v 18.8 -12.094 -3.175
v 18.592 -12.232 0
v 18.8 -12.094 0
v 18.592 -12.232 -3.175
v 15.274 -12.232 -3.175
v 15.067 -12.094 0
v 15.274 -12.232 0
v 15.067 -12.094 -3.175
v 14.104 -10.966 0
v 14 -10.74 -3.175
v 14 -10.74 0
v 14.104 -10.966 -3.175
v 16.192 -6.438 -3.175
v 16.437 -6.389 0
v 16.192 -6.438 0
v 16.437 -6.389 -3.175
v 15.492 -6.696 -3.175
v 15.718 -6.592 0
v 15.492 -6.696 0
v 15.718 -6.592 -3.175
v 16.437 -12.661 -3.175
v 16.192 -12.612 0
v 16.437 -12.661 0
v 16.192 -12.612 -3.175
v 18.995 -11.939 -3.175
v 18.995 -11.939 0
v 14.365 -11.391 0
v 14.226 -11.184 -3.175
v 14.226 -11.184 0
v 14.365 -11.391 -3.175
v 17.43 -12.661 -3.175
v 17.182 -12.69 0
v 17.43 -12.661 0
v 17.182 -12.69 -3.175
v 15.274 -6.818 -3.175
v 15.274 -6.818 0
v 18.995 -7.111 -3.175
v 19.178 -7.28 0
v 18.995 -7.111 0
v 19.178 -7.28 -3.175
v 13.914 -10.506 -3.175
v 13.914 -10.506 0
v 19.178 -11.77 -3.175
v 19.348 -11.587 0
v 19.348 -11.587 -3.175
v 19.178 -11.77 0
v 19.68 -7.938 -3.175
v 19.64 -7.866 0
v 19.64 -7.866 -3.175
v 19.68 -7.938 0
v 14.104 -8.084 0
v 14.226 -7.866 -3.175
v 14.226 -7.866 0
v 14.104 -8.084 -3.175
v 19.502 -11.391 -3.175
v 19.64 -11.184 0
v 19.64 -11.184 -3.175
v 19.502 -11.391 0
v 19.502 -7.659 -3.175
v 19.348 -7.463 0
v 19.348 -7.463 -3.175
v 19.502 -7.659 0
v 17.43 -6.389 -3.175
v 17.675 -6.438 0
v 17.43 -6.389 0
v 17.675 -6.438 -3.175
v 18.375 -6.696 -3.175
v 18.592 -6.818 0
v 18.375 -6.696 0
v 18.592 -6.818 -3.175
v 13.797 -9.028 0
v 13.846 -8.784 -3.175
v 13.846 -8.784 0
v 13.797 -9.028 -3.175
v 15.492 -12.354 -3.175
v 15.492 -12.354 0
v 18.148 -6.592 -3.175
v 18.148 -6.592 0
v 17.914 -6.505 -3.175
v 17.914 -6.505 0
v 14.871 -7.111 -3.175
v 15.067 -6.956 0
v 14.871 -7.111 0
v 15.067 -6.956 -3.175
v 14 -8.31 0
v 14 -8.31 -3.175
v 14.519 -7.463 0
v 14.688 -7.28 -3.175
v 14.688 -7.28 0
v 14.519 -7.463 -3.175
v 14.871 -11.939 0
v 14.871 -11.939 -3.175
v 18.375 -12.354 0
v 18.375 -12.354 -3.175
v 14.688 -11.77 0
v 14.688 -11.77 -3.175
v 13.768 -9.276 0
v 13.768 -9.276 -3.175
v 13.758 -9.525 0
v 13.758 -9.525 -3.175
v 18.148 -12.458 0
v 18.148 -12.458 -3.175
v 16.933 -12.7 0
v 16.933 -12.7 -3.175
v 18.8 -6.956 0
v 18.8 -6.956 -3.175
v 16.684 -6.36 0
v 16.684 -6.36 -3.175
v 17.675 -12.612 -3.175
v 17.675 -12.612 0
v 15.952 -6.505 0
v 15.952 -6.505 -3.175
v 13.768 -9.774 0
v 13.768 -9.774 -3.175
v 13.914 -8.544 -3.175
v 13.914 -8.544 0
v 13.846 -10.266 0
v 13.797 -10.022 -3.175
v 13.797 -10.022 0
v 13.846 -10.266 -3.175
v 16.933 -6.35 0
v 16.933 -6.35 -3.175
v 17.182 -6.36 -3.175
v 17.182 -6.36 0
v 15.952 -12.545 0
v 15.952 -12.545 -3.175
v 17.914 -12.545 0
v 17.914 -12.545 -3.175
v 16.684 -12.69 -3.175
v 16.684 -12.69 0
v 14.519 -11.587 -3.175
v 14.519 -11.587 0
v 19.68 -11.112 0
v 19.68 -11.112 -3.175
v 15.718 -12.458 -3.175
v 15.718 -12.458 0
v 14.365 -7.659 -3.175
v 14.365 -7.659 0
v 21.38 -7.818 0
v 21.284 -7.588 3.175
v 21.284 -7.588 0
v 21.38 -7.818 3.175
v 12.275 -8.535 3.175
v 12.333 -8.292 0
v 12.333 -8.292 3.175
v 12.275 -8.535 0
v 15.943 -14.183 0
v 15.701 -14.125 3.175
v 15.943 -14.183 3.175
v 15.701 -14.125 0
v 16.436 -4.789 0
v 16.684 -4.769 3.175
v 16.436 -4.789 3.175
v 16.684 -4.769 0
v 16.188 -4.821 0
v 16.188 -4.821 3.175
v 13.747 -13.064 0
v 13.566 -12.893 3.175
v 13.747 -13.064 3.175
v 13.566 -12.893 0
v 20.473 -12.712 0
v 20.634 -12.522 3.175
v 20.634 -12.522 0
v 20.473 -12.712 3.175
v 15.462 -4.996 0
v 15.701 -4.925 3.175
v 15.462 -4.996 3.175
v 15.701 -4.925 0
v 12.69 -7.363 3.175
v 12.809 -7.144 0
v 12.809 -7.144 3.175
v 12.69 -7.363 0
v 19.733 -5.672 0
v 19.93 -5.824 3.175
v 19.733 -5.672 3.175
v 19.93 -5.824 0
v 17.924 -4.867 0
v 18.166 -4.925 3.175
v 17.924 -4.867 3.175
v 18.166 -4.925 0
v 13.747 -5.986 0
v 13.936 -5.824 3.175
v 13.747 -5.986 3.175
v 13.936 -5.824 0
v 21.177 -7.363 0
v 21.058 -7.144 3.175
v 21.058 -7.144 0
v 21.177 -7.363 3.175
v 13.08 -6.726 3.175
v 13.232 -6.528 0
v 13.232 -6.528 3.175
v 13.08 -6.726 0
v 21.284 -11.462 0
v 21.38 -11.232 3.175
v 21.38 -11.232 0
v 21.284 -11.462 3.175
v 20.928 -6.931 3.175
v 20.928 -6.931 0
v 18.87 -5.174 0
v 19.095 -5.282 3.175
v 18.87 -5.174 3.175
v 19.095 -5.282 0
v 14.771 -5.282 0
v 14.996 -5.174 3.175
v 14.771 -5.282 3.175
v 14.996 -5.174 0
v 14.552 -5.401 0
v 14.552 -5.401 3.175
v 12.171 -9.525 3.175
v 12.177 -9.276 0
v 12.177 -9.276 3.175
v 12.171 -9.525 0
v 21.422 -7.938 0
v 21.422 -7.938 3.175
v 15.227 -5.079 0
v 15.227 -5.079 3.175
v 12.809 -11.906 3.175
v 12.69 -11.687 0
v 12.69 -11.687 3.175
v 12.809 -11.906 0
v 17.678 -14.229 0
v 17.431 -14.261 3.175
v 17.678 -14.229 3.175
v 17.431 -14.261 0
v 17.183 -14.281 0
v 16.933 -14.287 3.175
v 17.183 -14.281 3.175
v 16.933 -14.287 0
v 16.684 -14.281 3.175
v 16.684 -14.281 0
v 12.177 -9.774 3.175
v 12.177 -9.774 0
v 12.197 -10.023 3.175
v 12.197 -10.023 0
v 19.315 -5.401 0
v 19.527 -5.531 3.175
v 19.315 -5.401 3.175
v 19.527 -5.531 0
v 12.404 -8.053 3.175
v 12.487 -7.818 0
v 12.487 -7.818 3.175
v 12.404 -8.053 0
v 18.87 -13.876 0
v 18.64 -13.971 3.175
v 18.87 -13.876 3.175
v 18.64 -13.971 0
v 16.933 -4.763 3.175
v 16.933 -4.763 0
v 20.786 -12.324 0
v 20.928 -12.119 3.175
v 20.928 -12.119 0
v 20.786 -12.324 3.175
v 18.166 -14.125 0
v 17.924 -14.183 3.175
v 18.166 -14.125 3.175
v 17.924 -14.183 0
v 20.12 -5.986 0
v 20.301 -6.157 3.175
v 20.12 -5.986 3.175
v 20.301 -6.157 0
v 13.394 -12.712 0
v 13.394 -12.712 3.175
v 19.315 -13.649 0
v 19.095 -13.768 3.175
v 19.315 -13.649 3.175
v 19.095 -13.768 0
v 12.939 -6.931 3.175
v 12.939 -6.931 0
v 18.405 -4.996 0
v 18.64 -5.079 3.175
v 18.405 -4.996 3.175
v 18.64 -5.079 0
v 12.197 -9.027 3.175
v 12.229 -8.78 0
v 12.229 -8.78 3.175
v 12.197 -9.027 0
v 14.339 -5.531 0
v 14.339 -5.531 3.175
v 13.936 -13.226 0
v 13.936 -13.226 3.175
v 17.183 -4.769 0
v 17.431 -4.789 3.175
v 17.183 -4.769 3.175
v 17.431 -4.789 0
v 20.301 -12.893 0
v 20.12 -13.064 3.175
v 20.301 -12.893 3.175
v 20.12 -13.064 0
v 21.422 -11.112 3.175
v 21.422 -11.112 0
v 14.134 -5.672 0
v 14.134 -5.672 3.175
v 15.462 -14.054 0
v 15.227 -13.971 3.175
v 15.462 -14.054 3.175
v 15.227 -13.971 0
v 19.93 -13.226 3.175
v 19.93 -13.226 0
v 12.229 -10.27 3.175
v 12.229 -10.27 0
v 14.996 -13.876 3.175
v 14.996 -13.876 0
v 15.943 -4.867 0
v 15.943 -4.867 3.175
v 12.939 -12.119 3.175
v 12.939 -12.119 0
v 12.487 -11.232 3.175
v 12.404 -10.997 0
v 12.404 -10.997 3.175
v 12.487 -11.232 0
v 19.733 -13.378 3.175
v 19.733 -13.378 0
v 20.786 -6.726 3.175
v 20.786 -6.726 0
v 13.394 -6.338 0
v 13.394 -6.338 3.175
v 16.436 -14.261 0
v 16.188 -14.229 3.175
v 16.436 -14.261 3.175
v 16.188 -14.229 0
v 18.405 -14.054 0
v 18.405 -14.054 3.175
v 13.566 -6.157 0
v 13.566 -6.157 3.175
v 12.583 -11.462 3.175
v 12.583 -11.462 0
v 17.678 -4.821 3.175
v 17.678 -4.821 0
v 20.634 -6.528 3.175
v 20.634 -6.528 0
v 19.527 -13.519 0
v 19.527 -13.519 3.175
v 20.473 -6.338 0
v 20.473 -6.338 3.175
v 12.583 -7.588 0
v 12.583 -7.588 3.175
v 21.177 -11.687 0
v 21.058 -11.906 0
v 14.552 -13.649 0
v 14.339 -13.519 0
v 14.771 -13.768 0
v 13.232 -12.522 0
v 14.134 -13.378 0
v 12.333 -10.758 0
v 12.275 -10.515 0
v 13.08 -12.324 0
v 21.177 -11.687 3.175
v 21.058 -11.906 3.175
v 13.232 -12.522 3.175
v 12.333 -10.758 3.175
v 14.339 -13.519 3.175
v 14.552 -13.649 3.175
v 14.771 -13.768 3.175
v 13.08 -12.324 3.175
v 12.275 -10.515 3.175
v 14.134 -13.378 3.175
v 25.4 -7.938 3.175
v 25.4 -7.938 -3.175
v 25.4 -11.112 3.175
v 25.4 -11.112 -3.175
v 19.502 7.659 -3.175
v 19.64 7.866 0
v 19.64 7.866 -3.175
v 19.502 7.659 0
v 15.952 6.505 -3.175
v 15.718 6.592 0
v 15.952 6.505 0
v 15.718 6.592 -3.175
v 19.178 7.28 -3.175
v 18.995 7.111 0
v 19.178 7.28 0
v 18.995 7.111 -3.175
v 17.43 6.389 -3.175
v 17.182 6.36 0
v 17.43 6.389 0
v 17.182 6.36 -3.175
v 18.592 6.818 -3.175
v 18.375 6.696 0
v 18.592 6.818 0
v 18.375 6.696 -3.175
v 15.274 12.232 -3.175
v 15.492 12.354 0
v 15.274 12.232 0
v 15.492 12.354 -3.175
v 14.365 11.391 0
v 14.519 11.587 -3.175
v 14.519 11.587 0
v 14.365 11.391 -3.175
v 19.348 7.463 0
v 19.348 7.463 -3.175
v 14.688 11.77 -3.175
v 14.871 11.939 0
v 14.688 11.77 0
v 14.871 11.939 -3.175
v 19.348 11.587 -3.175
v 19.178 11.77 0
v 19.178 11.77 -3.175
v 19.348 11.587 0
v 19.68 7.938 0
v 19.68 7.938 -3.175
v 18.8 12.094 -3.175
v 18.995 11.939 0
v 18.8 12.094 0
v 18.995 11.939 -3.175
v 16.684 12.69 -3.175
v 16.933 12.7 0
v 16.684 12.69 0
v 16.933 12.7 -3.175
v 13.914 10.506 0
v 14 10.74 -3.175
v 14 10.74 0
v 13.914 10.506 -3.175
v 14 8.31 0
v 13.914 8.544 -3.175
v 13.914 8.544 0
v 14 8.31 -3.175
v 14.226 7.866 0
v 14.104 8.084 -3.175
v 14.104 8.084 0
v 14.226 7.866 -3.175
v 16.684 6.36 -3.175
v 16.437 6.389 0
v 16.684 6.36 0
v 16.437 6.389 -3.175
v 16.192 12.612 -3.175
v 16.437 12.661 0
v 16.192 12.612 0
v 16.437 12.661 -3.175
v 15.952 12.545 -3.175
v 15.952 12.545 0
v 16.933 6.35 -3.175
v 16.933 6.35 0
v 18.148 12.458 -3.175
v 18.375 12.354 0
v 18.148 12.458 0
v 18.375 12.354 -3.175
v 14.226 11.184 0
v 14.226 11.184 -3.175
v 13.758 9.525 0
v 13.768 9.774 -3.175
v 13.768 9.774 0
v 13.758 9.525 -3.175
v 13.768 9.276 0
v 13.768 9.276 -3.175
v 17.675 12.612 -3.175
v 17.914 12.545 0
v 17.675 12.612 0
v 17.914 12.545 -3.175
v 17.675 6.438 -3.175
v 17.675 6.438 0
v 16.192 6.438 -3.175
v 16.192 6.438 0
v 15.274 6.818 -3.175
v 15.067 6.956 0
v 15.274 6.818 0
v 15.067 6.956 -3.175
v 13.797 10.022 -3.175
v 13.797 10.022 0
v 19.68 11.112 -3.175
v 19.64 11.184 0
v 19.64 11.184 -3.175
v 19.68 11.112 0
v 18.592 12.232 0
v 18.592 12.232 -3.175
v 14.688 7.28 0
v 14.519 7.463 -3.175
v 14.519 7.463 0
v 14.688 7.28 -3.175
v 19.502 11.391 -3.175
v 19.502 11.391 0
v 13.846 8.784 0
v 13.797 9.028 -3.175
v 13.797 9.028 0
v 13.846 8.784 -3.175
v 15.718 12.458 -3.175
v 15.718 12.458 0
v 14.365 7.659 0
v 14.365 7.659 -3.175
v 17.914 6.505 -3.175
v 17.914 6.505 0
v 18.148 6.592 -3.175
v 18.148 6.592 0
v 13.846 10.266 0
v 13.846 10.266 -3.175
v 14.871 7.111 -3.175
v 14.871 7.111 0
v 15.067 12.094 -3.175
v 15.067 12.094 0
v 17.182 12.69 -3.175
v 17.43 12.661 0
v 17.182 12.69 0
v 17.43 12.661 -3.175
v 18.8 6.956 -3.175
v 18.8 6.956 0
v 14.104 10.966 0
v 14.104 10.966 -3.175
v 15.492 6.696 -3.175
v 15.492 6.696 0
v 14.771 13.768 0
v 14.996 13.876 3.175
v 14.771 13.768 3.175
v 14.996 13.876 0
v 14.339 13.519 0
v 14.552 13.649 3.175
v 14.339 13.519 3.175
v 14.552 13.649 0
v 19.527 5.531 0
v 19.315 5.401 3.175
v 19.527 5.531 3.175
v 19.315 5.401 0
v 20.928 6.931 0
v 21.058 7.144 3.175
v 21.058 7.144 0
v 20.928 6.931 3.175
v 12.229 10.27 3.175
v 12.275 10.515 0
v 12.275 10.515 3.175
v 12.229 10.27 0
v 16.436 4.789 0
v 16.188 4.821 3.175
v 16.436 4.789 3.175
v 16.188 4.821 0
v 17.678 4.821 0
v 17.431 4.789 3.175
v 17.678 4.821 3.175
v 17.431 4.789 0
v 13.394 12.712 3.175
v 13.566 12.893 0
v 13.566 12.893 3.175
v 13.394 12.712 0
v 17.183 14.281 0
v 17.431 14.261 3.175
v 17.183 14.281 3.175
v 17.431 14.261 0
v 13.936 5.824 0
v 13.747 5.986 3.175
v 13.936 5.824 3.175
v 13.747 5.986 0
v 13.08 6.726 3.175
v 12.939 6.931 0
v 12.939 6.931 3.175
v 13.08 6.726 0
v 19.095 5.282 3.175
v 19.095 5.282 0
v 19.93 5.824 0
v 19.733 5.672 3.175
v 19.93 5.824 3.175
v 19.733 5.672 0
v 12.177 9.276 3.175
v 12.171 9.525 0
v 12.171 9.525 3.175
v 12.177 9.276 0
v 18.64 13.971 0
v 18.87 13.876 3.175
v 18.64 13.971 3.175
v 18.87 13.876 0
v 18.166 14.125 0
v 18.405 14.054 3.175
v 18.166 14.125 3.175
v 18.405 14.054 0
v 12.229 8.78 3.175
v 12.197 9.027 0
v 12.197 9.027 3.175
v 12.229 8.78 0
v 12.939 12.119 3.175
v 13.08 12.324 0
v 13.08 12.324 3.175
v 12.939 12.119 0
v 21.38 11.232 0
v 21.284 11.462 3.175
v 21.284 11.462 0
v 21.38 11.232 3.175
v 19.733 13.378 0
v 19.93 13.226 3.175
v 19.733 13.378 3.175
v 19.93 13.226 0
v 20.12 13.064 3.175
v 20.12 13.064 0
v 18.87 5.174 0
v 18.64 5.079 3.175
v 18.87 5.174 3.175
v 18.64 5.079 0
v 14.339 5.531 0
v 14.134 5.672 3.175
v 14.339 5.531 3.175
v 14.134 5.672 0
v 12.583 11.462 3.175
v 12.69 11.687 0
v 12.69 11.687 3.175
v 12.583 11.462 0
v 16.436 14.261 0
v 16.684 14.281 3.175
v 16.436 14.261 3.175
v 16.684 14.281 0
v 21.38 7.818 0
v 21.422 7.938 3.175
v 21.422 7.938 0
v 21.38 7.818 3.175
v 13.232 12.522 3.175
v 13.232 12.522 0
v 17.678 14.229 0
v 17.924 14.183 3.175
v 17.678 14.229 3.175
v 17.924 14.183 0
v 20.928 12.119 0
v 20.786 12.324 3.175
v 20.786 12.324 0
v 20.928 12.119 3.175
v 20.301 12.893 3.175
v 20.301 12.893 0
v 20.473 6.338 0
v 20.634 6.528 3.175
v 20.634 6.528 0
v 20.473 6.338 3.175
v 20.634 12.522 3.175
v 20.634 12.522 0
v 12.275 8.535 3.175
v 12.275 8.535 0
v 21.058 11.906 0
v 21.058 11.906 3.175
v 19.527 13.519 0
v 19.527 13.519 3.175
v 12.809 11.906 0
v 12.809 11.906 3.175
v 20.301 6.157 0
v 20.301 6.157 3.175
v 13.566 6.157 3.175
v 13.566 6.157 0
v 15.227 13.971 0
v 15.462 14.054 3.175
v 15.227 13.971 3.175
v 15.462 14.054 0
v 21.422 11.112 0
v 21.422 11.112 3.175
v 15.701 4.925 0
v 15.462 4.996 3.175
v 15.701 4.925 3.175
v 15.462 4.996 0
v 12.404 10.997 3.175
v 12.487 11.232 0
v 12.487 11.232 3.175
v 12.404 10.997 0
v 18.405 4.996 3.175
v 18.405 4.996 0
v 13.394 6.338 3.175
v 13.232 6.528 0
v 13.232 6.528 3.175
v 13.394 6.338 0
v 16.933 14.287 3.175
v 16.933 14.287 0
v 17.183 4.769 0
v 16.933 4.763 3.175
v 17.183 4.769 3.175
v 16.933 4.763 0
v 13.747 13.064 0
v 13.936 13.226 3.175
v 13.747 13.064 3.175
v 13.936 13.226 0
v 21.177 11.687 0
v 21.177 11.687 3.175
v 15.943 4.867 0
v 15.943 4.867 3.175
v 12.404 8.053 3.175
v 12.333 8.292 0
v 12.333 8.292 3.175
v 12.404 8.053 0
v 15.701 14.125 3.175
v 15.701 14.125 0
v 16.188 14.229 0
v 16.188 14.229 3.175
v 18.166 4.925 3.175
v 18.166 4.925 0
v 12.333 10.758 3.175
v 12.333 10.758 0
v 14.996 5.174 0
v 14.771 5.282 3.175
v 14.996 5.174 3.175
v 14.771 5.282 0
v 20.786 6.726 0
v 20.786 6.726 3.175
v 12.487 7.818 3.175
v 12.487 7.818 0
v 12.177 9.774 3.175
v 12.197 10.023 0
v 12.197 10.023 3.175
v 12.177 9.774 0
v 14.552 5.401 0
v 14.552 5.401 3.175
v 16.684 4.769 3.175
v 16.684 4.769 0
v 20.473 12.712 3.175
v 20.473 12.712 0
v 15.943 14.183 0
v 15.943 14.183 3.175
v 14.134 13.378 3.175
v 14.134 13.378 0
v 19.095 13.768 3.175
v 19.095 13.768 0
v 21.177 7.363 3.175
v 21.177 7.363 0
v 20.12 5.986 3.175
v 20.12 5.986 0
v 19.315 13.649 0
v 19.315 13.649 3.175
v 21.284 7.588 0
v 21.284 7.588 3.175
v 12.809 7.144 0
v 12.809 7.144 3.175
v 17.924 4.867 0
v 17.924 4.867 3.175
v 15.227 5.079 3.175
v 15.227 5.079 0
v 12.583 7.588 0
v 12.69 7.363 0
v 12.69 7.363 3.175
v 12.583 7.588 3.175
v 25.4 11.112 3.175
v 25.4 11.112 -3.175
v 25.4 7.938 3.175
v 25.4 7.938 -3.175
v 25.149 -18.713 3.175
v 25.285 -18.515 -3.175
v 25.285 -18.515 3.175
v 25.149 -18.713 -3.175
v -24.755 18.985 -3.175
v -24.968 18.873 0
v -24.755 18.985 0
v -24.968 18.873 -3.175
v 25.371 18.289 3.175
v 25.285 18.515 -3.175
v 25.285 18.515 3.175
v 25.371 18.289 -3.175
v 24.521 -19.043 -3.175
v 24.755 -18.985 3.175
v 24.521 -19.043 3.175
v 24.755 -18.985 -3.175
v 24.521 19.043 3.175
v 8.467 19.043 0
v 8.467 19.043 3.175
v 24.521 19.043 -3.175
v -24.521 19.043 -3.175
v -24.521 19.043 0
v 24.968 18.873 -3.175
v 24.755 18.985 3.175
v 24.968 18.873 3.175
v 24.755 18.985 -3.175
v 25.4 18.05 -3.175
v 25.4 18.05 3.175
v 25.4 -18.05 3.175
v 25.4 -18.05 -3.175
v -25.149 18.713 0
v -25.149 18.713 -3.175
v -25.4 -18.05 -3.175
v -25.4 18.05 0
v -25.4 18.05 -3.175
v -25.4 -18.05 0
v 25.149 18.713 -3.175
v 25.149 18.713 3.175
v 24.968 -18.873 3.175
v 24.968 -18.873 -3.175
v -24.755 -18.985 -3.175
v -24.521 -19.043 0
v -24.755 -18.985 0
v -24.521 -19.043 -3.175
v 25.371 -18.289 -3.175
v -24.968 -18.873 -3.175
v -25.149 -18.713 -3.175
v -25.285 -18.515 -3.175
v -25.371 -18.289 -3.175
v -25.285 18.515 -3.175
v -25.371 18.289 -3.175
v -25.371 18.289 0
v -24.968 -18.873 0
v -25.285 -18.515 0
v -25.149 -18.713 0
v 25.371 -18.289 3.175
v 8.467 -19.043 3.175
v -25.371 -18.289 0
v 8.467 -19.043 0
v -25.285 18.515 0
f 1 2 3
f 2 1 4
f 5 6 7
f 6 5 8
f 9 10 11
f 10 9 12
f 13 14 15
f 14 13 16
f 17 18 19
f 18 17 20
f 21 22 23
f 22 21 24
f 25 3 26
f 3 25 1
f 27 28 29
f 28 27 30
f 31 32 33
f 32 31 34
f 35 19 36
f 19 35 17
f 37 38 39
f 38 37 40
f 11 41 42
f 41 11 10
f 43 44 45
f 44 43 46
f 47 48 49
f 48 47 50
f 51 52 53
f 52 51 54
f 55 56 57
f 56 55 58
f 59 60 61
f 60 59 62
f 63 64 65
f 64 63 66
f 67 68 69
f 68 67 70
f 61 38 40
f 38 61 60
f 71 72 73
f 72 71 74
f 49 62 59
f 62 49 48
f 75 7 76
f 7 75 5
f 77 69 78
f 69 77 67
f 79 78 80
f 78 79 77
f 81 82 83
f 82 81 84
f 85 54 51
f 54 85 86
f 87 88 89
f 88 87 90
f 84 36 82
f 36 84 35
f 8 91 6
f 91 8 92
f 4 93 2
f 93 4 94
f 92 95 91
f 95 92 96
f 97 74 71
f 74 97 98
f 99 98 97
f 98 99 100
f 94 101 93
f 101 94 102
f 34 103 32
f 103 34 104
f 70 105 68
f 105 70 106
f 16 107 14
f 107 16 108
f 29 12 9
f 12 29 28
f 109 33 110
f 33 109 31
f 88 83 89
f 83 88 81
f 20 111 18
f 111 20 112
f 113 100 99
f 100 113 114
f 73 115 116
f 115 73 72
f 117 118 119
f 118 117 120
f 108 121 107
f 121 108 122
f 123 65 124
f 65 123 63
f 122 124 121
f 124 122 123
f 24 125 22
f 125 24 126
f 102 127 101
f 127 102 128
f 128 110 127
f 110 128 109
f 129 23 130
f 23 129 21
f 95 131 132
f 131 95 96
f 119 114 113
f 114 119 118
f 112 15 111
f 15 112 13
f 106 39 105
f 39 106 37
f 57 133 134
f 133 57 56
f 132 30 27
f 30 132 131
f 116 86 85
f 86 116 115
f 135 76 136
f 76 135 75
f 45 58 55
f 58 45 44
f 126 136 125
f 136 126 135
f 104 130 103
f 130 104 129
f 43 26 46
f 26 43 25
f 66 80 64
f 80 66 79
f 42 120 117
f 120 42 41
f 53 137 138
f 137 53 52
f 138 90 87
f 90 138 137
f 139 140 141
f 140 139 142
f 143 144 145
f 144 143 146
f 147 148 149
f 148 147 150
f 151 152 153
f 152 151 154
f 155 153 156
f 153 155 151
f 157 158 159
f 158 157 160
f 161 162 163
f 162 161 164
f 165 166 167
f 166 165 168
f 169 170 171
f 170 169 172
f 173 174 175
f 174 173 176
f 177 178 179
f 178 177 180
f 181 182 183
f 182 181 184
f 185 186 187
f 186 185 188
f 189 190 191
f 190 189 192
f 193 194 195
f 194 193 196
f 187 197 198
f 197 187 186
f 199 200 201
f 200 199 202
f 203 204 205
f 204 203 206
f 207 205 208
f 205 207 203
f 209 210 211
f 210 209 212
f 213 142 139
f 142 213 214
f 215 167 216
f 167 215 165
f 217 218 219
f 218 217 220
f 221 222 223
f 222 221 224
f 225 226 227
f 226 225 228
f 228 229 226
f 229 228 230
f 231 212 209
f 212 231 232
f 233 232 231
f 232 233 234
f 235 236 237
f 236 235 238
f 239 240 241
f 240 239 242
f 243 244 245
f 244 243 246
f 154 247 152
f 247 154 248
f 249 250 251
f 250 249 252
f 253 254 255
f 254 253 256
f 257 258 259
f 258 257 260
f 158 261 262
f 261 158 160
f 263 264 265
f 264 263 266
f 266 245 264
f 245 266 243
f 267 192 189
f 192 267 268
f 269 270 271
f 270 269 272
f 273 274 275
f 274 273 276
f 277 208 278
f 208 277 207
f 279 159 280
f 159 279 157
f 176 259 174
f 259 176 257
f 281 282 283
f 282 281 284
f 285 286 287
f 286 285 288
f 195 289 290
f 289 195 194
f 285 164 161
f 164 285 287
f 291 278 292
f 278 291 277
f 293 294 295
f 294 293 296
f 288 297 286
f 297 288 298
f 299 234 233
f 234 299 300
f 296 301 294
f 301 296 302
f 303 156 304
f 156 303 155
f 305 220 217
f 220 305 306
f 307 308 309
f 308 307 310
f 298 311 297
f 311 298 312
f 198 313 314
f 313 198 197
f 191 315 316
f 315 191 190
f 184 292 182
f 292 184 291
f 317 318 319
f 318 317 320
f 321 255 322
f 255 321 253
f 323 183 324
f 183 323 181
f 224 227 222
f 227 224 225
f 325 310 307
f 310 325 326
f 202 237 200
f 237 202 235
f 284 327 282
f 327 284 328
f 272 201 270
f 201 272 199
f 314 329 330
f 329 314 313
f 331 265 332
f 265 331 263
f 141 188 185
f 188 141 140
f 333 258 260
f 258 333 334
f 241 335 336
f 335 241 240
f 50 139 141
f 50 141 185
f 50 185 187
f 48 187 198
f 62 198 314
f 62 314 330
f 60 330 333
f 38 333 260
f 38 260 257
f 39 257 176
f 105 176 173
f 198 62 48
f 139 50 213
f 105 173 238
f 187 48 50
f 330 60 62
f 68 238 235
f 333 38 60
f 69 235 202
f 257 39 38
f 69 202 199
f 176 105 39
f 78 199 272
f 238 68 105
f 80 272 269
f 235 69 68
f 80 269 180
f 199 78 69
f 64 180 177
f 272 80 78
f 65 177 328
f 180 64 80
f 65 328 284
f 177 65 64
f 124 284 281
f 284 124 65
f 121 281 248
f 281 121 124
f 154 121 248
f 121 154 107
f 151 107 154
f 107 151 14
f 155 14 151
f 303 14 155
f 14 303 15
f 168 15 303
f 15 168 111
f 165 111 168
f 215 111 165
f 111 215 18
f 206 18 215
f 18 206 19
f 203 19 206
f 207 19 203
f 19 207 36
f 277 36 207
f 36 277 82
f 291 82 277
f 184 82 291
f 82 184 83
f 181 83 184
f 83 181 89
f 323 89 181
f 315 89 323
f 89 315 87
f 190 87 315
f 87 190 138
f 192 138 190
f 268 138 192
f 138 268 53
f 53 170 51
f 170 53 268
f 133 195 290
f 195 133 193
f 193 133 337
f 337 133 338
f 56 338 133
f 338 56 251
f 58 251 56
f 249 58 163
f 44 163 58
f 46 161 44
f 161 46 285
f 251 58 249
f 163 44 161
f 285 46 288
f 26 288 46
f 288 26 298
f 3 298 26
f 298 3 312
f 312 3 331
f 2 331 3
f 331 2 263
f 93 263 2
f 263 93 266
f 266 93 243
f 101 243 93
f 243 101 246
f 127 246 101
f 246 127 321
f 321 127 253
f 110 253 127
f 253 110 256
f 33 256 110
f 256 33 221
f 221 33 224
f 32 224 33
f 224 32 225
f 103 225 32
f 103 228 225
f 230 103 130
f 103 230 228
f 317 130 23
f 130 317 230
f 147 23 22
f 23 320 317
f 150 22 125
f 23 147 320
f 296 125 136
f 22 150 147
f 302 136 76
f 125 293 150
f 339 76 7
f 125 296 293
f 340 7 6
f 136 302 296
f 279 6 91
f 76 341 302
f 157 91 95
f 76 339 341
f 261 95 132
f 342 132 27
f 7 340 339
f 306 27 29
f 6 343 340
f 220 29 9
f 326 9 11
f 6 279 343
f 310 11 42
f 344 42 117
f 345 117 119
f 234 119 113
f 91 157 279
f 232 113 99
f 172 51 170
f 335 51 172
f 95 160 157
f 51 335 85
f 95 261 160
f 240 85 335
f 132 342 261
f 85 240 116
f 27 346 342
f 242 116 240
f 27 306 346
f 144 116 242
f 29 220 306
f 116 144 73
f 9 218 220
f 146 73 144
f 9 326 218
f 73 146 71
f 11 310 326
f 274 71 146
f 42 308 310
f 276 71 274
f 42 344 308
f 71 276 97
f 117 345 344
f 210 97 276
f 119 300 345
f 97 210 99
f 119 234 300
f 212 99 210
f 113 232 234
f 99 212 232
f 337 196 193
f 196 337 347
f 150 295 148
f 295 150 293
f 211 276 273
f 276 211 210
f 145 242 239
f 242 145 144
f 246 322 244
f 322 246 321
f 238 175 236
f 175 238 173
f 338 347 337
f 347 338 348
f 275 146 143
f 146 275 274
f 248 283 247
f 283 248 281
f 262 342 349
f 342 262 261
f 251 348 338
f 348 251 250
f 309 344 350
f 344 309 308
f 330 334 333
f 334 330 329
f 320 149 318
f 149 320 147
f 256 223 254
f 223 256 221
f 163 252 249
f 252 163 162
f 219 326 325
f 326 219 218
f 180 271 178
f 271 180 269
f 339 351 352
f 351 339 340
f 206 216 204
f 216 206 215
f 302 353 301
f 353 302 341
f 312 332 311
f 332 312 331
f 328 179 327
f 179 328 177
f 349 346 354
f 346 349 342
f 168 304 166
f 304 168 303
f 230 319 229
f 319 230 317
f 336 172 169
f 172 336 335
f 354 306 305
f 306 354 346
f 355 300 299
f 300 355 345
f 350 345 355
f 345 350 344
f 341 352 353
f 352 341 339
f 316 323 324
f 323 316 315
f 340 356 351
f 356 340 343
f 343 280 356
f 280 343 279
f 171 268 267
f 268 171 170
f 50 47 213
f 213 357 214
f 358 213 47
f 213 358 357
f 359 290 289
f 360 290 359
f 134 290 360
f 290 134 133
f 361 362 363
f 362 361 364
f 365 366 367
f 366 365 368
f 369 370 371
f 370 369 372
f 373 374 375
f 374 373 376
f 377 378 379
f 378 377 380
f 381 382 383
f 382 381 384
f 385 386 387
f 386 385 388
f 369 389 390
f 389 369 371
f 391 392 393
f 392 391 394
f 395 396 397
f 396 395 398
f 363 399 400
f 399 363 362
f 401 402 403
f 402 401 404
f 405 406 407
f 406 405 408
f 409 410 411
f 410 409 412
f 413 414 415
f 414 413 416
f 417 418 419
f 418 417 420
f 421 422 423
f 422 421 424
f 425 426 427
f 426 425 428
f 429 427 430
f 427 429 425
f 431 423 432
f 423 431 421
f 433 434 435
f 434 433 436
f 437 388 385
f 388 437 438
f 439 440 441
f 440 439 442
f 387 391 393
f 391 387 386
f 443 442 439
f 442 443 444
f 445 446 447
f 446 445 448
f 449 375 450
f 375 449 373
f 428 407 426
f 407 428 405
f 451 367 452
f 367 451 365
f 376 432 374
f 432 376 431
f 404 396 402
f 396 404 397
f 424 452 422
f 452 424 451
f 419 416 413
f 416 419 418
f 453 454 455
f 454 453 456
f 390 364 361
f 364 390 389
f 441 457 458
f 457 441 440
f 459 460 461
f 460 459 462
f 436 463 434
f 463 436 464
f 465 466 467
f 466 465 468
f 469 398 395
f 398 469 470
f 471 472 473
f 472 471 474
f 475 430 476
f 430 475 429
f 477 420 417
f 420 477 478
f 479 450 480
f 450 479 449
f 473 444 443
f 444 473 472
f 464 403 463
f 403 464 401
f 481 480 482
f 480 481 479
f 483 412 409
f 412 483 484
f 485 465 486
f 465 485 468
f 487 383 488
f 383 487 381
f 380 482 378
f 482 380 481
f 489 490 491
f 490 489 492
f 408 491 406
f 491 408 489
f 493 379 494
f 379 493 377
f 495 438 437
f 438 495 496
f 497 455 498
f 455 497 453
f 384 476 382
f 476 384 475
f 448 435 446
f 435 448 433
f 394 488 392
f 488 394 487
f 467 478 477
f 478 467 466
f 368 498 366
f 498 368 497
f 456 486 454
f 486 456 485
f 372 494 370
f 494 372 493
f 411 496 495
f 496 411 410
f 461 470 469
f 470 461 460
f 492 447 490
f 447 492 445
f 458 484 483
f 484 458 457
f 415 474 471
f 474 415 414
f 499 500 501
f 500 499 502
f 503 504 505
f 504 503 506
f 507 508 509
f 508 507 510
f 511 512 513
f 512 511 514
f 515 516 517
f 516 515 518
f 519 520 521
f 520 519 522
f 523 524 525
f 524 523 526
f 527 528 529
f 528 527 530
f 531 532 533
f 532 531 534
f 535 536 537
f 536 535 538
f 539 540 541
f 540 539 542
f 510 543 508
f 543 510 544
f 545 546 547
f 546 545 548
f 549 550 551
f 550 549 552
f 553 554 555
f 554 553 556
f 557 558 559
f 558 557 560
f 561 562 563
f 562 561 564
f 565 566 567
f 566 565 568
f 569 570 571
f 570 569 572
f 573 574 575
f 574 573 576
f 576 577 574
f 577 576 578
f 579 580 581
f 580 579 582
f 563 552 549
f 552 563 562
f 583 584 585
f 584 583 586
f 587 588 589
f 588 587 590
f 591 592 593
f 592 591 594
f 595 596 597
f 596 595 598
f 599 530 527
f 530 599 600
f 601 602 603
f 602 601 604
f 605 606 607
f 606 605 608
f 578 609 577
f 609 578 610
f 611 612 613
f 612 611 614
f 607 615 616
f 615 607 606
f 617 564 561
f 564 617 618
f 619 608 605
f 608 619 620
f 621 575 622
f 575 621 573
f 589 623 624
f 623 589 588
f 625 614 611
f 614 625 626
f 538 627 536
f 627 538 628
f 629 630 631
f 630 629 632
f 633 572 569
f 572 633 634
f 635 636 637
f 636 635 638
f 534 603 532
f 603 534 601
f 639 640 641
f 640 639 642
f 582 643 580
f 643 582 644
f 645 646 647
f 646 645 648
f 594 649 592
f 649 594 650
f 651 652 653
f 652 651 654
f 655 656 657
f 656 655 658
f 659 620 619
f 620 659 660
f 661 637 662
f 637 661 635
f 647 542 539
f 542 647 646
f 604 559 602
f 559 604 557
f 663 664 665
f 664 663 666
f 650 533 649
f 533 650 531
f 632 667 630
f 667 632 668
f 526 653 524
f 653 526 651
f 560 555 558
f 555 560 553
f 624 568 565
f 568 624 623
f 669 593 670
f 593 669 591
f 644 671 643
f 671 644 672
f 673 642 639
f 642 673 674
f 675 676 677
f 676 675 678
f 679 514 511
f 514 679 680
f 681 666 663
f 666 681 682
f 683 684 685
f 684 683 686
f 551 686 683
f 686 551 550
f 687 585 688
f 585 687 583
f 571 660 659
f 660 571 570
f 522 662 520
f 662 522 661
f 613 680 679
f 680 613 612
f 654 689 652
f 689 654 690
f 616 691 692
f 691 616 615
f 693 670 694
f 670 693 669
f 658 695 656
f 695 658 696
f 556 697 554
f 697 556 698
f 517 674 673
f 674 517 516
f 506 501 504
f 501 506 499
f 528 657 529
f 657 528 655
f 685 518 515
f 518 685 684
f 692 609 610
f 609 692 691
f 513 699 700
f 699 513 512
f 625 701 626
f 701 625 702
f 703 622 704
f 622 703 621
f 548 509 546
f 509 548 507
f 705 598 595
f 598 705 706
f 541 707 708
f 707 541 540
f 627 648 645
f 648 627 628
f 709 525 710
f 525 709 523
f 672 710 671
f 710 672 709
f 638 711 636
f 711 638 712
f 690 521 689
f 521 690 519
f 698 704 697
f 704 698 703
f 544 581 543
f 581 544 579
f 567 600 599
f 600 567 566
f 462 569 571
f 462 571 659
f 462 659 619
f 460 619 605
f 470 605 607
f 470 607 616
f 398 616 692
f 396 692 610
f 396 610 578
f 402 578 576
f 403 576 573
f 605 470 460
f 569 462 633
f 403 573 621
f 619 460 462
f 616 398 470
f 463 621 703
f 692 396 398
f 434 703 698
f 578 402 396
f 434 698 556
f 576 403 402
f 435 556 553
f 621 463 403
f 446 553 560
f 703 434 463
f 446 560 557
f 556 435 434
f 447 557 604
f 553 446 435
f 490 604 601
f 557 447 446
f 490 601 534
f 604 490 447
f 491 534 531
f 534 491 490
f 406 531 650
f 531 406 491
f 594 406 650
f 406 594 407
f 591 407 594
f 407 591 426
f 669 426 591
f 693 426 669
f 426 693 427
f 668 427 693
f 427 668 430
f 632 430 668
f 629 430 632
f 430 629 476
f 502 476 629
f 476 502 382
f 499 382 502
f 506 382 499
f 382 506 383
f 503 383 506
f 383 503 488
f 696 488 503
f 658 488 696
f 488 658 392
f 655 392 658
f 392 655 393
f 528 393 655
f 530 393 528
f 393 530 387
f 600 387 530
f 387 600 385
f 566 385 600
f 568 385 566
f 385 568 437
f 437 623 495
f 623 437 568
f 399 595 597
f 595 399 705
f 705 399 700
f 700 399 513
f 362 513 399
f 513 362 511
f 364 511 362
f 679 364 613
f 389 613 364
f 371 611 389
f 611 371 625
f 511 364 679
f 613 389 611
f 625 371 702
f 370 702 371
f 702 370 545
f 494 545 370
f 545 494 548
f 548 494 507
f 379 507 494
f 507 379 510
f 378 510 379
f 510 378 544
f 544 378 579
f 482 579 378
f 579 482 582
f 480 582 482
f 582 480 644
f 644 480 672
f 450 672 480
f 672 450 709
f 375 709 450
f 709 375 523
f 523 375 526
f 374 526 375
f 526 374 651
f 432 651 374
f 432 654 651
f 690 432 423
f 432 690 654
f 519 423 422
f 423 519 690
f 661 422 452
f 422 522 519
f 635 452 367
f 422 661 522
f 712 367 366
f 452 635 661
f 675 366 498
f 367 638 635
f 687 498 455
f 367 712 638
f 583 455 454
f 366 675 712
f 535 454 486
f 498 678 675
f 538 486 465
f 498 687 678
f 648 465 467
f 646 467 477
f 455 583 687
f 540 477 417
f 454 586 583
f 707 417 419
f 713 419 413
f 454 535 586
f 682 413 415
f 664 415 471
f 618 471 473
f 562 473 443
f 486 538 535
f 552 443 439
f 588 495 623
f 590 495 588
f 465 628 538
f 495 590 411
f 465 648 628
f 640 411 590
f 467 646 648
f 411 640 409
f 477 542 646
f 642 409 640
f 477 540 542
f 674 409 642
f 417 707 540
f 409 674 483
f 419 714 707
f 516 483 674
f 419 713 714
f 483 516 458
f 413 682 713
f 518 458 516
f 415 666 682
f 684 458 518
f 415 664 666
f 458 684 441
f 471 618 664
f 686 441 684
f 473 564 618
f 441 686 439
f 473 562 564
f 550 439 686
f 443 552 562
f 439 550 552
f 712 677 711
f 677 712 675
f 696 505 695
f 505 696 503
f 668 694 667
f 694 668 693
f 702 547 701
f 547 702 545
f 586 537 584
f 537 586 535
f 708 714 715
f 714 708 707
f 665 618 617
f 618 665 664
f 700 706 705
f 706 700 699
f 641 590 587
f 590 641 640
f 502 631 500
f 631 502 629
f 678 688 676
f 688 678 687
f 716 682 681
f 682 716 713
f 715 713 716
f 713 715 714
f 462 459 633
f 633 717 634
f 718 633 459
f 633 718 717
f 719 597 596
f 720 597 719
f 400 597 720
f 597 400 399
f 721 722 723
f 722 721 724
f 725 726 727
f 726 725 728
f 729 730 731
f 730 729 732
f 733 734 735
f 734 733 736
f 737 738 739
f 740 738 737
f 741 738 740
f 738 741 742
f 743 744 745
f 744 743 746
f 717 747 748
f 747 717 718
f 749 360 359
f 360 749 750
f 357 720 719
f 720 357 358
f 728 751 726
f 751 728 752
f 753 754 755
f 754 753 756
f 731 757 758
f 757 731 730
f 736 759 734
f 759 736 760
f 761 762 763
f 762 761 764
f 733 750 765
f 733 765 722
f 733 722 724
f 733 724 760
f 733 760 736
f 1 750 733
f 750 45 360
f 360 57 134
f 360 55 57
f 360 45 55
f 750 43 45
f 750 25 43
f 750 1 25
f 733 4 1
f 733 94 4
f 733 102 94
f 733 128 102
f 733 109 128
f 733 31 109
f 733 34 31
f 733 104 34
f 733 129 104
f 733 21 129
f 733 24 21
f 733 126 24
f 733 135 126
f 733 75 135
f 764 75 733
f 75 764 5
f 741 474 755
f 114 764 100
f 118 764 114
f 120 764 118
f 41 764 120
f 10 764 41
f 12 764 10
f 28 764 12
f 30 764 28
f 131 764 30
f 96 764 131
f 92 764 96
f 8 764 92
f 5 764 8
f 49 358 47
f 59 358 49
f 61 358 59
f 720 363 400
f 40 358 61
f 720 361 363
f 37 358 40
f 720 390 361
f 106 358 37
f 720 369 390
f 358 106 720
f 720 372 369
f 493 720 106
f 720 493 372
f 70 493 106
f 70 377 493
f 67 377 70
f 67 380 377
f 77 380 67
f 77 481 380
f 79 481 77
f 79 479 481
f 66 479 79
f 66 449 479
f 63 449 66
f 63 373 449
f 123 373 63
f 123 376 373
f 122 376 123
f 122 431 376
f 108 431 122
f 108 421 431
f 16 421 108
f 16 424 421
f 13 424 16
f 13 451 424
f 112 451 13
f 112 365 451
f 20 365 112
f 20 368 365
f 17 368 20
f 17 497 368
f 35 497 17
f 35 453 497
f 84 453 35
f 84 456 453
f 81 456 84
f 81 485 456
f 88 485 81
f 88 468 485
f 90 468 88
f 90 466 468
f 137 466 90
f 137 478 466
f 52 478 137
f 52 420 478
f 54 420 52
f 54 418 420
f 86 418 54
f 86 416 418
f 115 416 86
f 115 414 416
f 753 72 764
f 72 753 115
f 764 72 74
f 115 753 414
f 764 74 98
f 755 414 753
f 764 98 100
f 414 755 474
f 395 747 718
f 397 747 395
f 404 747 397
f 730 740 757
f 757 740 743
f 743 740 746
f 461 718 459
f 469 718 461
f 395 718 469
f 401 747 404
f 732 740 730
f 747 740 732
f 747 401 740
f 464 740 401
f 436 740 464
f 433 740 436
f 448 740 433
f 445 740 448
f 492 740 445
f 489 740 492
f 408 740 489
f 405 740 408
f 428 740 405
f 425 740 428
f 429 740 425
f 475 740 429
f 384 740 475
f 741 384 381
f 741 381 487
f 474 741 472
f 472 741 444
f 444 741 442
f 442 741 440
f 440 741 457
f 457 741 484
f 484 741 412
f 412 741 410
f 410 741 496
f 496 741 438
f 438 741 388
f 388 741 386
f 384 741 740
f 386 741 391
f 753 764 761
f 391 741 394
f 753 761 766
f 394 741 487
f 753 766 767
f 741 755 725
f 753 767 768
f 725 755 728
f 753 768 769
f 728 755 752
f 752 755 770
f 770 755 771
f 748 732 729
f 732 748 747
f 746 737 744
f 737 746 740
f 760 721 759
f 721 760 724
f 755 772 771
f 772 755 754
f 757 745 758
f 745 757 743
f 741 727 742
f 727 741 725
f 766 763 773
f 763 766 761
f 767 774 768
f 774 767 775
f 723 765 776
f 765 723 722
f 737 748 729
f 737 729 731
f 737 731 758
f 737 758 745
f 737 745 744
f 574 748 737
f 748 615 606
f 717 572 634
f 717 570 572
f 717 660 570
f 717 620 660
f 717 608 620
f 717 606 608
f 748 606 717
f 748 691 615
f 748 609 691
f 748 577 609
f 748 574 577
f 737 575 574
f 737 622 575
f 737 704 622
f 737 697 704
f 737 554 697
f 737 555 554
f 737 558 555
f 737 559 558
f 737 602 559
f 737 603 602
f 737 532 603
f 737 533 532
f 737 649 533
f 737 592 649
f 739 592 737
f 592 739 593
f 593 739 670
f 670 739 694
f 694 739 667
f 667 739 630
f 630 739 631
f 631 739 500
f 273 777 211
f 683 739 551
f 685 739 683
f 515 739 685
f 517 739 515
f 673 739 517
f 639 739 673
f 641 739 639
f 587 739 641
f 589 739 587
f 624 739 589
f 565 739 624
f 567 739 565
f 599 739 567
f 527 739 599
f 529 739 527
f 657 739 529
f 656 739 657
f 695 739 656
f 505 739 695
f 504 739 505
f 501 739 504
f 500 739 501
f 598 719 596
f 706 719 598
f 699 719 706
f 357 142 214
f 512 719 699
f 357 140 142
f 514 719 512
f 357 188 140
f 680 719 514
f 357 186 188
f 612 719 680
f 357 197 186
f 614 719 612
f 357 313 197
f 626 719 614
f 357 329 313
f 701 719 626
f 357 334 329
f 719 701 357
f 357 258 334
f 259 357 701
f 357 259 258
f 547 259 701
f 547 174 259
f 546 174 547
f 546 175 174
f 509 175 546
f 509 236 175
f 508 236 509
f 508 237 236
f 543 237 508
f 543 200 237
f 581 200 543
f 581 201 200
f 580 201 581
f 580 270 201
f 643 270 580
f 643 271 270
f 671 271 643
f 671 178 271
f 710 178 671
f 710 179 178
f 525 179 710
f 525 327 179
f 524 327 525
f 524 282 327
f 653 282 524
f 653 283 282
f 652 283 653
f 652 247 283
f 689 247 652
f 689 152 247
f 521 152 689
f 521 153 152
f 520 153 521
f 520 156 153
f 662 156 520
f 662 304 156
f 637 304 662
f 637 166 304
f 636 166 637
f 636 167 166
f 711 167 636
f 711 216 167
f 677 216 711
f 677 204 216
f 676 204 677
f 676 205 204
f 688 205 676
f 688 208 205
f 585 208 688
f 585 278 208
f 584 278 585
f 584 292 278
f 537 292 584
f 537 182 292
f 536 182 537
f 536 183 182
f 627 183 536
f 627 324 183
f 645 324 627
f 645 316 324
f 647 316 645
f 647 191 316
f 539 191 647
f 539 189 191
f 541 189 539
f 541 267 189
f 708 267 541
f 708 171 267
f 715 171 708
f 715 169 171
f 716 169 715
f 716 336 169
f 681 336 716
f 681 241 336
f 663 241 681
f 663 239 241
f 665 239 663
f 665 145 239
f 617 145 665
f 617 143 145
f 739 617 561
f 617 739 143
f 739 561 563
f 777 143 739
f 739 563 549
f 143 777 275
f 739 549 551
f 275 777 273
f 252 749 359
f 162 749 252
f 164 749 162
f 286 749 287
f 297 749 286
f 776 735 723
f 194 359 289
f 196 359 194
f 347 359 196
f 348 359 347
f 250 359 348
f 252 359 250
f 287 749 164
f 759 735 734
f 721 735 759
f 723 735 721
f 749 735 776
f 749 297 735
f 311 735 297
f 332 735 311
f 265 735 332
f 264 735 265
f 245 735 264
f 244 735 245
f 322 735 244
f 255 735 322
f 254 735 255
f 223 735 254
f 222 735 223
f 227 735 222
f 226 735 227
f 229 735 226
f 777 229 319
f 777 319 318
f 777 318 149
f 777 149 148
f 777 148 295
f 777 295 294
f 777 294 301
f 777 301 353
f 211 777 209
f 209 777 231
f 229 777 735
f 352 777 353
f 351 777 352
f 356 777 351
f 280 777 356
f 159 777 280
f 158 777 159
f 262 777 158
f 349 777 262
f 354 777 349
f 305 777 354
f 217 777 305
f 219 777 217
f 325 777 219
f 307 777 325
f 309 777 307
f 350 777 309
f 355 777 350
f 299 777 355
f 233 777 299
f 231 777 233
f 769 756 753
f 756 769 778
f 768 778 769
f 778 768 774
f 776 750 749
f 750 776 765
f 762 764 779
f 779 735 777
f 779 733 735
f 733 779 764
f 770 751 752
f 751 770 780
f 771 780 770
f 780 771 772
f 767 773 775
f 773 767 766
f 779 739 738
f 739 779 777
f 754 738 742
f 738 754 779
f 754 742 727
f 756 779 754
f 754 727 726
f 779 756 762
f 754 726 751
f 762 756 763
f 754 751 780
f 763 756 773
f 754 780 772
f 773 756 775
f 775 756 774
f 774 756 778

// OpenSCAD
// values for making smooth arcs
$fa = 2;
$fs = 0.25;

function inchesToMilliMeters(inches) = inches * 25.4;

number_of_holes = 2; // ** change this value for a different number of holes **
width = inchesToMilliMeters(2);
depth = inchesToMilliMeters(number_of_holes * 0.75);
height = inchesToMilliMeters(1/4);

hole_radius = inchesToMilliMeters(1/4) / 2;
groove_width = inchesToMilliMeters(1/8);
indent_hole_radius = inchesToMilliMeters(3/8) / 2;

module rounded_cube(size, r=0, center=false, $fn=20){
    translate([(center)?0:r, (center)?0:r, (center)?0:r])
    minkowski(){
        cube([size[0]-r*2, size[1]-r*2, size[2]-r*2], center=center);
        sphere(r, $fn=$fn);
    }
}

module rounded_corner_rect(size, center=false, r=1.5){
    x = size[0];
    y = size[1];
    z = size[2];
    translate([center?-(x/2-r):r, center?-(y/2-r):r, center?-(z/2):0]) {
        minkowski(){
            cube([x-2*r, y-2*r, z/2]);
            cylinder(r=r,h=z/2);
        }
    }
}

difference() {

    rounded_corner_rect(size=[width,depth,height], center=true, r=1);
    
    translate([width*-1/3,0,height*1/2]) {
        cube([width,depth*2,height], center=true);
    }
    
    for(i = [0:number_of_holes-1]) {
        offset = (depth-2*hole_radius*number_of_holes)/(2*number_of_holes);
        y = ((-depth/2) + (hole_radius)) + (depth/number_of_holes*i) + offset;
        translate([width*1/3,y,-height]) {

            cylinder(r=hole_radius,h=height*2);
            translate([0,0,height]) {
                cylinder(r=indent_hole_radius,h=height);
            }
            translate([0,-groove_width/2,0]) {
                cube([width,groove_width,height*2]);
            }
        }
    }
}
